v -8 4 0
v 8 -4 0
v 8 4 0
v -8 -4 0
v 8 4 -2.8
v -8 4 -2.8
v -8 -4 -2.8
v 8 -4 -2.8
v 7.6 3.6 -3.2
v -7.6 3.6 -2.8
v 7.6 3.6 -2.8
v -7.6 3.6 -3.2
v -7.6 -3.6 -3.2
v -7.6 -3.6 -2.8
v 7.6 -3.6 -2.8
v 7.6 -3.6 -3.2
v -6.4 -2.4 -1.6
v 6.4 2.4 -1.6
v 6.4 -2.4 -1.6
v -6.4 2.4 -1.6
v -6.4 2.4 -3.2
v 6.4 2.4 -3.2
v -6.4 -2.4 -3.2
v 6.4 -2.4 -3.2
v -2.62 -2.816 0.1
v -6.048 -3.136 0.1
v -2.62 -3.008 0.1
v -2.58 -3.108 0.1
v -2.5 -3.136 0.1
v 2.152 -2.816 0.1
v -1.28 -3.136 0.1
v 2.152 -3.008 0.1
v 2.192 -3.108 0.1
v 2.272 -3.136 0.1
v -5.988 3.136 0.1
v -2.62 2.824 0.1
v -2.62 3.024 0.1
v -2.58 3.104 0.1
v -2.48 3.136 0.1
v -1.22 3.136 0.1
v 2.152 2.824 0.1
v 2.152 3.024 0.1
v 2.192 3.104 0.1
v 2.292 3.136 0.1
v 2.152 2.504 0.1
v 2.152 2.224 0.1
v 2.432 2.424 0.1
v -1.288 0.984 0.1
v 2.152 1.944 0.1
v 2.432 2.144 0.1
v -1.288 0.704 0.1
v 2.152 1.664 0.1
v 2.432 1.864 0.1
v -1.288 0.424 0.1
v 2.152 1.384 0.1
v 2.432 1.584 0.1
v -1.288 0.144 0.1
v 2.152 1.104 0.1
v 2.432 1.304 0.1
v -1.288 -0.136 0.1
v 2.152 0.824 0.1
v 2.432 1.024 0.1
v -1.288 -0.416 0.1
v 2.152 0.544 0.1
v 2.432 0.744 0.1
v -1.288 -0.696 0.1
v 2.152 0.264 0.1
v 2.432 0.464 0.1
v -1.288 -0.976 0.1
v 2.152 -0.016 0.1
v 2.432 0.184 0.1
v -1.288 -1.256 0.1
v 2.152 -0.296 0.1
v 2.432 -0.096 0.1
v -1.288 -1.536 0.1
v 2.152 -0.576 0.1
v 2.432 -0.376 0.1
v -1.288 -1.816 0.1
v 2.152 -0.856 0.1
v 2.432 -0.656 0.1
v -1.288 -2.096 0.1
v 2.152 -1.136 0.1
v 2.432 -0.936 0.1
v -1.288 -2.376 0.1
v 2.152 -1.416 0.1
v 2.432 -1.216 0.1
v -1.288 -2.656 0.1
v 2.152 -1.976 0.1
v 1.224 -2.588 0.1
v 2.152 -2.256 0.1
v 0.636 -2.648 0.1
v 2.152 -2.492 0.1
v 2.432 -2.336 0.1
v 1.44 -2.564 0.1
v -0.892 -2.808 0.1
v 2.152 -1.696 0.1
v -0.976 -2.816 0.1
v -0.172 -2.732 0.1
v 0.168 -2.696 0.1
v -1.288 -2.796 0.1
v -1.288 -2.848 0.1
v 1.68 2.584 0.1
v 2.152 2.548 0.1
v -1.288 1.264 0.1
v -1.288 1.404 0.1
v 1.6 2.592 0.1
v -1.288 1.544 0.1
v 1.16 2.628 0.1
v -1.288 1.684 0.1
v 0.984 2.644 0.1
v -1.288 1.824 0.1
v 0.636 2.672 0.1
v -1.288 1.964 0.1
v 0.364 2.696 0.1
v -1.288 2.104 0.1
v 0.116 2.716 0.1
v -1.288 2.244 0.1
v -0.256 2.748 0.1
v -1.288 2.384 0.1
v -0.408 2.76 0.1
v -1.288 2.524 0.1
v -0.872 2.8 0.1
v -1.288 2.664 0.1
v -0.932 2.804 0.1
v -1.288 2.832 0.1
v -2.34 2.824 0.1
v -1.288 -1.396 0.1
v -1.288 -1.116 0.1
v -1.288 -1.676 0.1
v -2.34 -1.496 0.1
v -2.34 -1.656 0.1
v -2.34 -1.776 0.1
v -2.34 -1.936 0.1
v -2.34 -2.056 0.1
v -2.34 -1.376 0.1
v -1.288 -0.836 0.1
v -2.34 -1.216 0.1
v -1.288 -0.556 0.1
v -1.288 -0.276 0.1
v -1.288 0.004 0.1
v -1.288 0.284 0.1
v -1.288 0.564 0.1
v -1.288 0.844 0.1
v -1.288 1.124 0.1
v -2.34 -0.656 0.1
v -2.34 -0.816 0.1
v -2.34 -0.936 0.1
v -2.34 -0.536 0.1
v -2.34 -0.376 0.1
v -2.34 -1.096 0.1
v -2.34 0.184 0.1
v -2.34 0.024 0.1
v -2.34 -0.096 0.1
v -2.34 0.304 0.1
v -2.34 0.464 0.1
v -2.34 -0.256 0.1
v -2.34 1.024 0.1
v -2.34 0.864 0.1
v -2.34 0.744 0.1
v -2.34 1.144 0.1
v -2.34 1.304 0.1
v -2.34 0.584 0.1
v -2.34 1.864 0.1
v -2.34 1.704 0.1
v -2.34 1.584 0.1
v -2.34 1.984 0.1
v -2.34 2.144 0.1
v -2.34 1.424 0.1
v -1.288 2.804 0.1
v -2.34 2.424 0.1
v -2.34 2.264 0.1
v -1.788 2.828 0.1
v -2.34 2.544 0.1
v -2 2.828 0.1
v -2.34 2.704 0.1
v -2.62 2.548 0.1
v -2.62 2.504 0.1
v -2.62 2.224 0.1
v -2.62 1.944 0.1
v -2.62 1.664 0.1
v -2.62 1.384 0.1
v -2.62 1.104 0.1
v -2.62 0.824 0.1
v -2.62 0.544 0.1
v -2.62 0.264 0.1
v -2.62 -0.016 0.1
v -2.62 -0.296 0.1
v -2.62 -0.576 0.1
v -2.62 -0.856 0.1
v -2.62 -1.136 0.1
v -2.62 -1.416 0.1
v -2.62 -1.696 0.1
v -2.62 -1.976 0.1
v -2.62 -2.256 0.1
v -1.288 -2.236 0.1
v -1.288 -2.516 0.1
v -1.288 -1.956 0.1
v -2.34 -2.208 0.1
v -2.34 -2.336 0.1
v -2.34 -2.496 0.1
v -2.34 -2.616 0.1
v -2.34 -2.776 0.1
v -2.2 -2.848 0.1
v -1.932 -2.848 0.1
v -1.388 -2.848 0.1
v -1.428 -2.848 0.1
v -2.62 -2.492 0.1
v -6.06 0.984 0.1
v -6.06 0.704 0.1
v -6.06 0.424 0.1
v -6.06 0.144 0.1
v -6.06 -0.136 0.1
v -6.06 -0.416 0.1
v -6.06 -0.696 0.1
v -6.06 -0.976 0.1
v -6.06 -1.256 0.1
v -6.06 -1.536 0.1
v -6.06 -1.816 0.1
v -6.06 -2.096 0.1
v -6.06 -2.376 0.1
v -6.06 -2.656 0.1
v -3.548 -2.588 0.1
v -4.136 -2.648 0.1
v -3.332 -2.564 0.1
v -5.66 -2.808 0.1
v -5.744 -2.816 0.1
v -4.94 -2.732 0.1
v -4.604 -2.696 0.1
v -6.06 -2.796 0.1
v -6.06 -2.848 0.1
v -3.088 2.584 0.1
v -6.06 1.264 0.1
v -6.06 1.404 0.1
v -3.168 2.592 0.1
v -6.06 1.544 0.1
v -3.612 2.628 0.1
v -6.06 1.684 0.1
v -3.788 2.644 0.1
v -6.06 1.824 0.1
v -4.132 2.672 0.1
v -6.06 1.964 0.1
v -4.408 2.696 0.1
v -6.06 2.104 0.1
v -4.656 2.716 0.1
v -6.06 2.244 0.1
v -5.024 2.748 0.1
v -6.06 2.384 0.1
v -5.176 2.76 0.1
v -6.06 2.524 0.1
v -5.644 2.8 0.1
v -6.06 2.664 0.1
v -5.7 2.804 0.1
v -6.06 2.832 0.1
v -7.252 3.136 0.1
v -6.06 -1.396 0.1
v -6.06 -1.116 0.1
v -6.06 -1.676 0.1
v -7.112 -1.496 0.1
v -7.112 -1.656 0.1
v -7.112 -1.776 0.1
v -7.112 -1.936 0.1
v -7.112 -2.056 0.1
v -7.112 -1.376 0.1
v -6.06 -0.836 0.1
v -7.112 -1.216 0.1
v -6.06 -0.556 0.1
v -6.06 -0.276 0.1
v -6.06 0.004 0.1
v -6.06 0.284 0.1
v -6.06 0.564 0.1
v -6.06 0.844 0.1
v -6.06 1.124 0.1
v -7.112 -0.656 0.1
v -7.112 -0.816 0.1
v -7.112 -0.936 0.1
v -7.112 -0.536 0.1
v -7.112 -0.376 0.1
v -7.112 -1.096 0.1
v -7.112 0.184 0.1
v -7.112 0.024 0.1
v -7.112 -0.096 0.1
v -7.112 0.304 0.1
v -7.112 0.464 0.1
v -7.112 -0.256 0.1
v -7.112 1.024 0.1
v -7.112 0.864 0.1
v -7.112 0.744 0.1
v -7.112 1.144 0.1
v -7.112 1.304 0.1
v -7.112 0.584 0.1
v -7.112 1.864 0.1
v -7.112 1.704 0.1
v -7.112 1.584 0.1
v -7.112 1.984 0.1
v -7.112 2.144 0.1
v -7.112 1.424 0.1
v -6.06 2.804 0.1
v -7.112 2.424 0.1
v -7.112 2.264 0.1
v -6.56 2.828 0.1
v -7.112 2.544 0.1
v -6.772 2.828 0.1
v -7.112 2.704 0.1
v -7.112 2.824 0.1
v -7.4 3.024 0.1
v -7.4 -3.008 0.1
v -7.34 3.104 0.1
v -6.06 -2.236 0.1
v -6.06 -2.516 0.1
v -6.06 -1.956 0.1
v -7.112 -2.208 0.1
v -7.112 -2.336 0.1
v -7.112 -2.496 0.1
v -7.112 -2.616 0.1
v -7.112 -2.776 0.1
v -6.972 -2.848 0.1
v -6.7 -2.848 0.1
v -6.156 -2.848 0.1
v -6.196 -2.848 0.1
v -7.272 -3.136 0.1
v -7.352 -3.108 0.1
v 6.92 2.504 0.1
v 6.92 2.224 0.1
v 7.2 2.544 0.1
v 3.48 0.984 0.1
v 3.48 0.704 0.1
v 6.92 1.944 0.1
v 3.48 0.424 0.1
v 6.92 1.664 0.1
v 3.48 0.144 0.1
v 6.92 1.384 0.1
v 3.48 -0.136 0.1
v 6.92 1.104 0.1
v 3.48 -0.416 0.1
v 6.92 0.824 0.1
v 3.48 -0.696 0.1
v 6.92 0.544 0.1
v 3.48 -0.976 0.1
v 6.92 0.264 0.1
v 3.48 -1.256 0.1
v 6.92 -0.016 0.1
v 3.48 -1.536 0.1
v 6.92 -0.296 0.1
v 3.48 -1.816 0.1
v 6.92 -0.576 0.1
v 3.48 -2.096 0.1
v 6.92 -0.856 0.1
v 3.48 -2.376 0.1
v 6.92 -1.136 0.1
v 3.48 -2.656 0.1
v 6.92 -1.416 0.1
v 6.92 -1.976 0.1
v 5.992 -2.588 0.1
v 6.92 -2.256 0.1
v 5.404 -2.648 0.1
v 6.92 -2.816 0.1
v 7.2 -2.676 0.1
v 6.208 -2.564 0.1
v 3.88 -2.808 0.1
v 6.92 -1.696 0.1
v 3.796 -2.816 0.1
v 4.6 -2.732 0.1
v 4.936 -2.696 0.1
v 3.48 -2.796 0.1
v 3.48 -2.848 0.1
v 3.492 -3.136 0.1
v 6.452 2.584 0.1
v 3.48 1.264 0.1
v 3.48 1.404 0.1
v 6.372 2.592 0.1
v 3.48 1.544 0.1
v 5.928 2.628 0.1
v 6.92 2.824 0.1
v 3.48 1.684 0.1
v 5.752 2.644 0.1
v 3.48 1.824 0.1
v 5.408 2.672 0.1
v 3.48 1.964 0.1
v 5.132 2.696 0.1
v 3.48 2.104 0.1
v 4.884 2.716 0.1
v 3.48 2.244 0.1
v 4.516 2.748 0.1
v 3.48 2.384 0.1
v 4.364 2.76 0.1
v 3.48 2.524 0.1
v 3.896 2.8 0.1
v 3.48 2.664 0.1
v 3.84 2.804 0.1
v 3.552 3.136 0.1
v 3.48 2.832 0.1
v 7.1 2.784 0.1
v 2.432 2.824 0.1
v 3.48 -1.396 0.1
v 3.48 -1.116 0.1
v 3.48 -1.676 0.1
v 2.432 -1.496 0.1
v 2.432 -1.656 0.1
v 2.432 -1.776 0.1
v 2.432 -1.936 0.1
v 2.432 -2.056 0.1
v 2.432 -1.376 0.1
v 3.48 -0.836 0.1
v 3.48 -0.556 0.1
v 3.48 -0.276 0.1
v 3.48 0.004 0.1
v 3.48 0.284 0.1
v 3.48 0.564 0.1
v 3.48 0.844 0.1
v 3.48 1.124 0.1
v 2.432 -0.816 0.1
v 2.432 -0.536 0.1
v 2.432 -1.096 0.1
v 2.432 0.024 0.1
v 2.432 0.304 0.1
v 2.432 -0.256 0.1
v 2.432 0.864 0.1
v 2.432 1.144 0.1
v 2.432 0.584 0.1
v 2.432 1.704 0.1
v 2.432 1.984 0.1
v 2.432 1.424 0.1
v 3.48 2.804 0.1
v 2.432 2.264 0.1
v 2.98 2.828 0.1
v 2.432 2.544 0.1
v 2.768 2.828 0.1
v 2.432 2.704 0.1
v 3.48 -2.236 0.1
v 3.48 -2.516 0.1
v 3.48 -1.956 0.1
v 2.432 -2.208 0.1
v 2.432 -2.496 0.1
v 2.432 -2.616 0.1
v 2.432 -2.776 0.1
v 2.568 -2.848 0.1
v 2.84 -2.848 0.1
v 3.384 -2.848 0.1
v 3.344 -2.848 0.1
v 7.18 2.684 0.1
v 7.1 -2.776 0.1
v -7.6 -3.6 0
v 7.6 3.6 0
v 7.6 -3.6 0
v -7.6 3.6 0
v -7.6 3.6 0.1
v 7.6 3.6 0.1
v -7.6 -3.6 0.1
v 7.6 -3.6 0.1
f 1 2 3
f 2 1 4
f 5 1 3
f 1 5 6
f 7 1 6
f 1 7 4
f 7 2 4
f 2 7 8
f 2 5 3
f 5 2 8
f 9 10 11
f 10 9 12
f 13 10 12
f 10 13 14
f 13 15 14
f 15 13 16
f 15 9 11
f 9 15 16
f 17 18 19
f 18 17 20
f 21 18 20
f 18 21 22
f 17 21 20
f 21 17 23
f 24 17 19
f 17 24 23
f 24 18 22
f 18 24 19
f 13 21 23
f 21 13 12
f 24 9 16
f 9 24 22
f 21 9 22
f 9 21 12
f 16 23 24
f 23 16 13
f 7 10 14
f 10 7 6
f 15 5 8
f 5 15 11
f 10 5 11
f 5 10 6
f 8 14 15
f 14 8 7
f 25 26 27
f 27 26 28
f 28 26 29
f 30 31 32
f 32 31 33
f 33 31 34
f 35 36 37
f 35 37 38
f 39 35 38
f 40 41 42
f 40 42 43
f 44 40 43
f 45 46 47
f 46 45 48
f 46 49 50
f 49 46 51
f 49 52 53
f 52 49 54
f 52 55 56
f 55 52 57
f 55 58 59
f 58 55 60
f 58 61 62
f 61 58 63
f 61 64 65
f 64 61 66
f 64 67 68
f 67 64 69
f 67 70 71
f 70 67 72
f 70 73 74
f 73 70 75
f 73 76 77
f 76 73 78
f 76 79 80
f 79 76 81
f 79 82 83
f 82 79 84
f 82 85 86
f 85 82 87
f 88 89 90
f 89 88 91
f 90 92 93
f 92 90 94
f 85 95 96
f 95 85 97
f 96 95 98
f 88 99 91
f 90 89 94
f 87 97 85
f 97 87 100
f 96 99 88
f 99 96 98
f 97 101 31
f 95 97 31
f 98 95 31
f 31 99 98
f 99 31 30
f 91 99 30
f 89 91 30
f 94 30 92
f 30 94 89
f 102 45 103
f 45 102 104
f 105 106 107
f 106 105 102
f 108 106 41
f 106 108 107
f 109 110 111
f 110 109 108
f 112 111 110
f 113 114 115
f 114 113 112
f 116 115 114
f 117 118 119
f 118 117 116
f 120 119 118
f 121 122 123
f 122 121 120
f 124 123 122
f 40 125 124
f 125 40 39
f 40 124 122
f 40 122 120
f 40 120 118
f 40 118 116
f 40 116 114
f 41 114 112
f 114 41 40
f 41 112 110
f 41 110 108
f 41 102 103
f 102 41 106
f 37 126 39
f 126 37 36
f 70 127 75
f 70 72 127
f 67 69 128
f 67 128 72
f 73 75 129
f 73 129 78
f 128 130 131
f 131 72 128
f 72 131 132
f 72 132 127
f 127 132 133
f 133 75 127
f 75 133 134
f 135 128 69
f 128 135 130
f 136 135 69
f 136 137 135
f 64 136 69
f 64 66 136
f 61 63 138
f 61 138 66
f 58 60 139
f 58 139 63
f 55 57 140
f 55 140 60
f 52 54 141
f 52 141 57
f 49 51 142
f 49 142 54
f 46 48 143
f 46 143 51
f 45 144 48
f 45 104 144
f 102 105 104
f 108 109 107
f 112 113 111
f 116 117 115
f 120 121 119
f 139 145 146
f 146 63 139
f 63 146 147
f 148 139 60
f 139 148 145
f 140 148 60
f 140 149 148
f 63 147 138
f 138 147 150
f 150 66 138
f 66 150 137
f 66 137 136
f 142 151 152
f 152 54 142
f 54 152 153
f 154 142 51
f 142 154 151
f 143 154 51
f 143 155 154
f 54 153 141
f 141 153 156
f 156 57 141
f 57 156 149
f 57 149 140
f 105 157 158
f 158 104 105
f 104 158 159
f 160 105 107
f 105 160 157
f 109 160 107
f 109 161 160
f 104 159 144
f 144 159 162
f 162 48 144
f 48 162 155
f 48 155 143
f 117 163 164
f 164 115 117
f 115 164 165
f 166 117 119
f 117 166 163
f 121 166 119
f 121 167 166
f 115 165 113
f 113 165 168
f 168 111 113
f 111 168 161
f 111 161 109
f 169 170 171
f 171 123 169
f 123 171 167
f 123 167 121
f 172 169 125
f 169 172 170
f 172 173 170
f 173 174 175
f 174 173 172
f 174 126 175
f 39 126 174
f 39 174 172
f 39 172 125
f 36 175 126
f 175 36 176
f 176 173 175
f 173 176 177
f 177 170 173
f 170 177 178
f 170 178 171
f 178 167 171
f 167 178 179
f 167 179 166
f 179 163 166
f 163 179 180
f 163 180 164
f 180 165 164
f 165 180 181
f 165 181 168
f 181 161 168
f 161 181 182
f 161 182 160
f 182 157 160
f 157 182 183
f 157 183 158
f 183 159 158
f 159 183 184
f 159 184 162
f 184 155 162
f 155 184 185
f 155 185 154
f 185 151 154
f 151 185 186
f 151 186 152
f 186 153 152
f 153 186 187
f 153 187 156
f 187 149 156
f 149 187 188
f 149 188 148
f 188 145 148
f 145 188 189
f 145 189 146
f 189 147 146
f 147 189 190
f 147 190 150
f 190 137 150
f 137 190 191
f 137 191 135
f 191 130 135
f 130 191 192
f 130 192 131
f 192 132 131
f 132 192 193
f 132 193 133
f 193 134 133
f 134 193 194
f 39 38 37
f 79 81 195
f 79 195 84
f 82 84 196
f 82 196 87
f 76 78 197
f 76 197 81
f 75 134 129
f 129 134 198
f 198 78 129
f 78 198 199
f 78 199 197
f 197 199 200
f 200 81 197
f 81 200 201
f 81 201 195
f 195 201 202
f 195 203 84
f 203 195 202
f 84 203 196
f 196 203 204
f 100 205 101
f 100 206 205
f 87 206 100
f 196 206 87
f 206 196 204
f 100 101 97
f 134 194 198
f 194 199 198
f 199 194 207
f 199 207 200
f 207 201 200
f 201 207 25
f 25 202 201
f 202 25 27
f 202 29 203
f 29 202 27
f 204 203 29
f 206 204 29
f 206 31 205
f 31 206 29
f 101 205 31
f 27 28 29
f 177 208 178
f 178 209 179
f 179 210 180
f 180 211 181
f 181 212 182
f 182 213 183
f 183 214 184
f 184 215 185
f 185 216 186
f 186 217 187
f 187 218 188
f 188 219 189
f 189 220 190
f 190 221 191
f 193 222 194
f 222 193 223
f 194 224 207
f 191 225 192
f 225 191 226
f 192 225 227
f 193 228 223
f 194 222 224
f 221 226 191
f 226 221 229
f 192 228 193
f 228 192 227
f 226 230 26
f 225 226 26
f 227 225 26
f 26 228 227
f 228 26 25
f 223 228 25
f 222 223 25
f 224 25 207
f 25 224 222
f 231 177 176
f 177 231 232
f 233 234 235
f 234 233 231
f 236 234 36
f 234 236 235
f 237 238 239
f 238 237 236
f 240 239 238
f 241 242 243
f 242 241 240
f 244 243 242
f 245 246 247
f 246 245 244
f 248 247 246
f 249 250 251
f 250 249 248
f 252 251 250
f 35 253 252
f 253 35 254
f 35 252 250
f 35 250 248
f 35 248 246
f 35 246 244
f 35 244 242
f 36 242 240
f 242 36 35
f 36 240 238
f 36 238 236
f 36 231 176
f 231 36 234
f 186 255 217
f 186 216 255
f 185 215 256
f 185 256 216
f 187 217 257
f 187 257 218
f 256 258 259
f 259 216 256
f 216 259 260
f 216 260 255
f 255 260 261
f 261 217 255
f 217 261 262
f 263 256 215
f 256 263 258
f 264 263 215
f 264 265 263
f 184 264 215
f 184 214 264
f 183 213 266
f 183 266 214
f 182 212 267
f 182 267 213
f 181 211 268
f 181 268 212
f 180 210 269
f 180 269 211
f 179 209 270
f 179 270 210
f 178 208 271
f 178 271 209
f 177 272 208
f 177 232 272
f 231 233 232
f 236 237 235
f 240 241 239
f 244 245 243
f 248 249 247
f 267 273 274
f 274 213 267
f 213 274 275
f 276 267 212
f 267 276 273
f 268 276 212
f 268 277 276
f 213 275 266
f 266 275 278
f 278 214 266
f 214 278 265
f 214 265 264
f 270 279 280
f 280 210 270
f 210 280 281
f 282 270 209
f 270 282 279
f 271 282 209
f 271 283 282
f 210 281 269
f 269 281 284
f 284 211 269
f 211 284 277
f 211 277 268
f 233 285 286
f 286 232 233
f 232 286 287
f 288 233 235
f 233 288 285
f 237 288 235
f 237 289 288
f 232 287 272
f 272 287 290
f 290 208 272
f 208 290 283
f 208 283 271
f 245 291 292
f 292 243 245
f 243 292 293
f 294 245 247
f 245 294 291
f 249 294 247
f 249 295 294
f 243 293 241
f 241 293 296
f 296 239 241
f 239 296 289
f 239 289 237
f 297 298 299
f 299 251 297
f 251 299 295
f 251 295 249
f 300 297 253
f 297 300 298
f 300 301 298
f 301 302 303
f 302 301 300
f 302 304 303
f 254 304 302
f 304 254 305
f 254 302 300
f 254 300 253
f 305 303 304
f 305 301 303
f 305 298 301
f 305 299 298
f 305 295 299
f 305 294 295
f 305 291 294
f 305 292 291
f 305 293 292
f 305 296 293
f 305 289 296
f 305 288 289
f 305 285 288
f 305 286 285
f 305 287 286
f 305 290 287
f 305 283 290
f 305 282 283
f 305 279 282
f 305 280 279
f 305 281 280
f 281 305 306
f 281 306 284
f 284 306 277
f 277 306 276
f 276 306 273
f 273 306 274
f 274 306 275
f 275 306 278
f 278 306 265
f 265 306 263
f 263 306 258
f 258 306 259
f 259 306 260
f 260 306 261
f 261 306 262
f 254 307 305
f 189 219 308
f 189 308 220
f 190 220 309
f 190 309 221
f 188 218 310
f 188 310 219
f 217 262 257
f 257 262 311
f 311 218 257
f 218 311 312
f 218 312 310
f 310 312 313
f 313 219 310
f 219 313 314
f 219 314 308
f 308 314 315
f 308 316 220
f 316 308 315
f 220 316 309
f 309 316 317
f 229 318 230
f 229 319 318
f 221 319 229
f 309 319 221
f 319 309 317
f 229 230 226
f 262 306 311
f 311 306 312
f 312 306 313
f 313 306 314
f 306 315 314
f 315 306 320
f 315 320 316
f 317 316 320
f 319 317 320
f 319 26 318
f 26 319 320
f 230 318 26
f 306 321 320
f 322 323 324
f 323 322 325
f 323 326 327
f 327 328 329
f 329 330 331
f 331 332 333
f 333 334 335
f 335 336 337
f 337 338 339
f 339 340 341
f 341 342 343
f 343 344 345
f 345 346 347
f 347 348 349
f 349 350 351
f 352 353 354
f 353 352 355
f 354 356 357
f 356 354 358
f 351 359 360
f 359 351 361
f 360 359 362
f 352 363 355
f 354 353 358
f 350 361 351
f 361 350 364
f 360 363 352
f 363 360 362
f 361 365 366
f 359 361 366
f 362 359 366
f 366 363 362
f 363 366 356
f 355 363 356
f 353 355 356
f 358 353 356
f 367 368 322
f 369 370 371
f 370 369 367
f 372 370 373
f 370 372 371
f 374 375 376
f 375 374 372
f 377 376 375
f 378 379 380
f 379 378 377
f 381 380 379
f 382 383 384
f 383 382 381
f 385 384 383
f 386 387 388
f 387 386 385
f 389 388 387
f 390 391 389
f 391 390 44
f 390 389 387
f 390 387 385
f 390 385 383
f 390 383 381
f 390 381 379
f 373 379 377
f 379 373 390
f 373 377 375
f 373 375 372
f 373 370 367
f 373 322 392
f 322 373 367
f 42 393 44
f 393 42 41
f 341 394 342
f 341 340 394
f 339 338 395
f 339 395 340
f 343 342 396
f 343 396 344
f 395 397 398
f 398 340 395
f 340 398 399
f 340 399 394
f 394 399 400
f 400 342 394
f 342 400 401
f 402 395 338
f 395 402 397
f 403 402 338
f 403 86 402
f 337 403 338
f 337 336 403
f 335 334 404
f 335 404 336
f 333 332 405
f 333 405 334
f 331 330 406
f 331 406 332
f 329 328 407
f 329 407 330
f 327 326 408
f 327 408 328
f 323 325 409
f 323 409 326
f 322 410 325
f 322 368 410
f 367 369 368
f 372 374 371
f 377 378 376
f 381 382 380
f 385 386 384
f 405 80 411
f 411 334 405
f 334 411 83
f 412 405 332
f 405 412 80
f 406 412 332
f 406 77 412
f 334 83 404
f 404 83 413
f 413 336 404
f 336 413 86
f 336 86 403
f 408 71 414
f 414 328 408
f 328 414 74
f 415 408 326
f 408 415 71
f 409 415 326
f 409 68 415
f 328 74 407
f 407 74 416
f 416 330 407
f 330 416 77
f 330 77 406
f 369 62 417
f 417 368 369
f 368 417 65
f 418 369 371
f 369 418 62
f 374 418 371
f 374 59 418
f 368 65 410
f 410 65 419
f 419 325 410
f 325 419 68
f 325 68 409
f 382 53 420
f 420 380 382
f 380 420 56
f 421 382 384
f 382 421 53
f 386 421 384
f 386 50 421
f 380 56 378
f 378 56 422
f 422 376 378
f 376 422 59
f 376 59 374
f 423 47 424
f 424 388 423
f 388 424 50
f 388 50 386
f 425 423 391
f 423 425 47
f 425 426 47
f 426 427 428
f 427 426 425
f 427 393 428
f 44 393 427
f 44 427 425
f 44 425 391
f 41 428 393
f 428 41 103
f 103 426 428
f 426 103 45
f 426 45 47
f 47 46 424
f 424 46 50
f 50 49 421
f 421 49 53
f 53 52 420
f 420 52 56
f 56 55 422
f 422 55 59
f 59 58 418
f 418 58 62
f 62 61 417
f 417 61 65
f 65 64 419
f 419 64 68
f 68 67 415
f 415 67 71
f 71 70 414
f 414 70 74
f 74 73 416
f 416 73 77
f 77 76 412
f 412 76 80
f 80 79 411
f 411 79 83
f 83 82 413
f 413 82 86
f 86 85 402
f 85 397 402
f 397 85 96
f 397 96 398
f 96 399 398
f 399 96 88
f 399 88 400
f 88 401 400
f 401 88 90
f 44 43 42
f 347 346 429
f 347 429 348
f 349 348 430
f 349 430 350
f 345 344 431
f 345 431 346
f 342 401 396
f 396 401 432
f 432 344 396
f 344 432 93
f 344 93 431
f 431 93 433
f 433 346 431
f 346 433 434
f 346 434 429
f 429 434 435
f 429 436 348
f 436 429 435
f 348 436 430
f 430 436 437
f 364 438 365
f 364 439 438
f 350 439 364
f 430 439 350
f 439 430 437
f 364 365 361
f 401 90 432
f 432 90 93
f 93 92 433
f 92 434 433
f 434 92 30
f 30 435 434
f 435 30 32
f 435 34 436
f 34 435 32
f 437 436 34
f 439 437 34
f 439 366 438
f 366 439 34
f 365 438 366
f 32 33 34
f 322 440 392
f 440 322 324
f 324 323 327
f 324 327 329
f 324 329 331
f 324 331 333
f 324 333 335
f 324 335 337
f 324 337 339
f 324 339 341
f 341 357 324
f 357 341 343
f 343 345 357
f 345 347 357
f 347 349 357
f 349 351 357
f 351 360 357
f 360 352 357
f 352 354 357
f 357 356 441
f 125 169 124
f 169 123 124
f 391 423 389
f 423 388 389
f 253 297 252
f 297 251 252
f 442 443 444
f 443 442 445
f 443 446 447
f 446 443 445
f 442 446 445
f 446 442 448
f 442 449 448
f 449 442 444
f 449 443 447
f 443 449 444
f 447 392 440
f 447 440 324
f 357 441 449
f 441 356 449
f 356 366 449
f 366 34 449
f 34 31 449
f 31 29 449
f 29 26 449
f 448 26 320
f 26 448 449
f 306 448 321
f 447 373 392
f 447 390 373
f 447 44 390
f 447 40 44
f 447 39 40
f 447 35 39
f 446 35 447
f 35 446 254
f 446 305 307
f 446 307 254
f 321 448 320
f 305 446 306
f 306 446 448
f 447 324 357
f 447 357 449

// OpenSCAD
use <../lib.scad>
use <3069b.scad>
use <4263304g.scad>
function ldraw_lib__3069bd1m() = [
// 0 Tile  1 x  2 with Vertical Vents Sticker
// 0 Name: 3069bd1m.dat
// 0 Author: Vincent Messenet [Cheenzo]
// 0 !LDRAW_ORG Shortcut UPDATE 2025-05
// 0 !LICENSE Licensed under CC BY 4.0 : see CAreadme.txt
// 
// 0 BFC CERTIFY CCW
  [0,"BFC","CERTIFY"],
  [0,"BFC","CCW"],
// 
// 0 !CATEGORY Sticker Shortcut
// 0 !KEYWORDS Bricklink 3069pb0152, Set 10133
// 
// 0 !HISTORY 2025-05-28 [OrionP] Official Update 2025-05
// 
// 1 16 0 0 0 1 0 0 0 1 0 0 0 1 3069b.dat
  [1,16,0,0,0,1,0,0,0,1,0,0,0,1, ldraw_lib__3069b()],
// 1 16 0 0 0 1 0 0 0 1 0 0 0 1 4263304g.dat
  [1,16,0,0,0,1,0,0,0,1,0,0,0,1, ldraw_lib__4263304g()],
];
module ldraw_lib__3069bd1m(step=0, col=false, unit=2/5, alt=false, line=0.2, solid=!$preview)
    makepoly(ldraw_lib__3069bd1m(), step=step, col=col, unit=unit, alt=alt, line=line, solid=solid);
ldraw_lib__3069bd1m(line=0.2);
